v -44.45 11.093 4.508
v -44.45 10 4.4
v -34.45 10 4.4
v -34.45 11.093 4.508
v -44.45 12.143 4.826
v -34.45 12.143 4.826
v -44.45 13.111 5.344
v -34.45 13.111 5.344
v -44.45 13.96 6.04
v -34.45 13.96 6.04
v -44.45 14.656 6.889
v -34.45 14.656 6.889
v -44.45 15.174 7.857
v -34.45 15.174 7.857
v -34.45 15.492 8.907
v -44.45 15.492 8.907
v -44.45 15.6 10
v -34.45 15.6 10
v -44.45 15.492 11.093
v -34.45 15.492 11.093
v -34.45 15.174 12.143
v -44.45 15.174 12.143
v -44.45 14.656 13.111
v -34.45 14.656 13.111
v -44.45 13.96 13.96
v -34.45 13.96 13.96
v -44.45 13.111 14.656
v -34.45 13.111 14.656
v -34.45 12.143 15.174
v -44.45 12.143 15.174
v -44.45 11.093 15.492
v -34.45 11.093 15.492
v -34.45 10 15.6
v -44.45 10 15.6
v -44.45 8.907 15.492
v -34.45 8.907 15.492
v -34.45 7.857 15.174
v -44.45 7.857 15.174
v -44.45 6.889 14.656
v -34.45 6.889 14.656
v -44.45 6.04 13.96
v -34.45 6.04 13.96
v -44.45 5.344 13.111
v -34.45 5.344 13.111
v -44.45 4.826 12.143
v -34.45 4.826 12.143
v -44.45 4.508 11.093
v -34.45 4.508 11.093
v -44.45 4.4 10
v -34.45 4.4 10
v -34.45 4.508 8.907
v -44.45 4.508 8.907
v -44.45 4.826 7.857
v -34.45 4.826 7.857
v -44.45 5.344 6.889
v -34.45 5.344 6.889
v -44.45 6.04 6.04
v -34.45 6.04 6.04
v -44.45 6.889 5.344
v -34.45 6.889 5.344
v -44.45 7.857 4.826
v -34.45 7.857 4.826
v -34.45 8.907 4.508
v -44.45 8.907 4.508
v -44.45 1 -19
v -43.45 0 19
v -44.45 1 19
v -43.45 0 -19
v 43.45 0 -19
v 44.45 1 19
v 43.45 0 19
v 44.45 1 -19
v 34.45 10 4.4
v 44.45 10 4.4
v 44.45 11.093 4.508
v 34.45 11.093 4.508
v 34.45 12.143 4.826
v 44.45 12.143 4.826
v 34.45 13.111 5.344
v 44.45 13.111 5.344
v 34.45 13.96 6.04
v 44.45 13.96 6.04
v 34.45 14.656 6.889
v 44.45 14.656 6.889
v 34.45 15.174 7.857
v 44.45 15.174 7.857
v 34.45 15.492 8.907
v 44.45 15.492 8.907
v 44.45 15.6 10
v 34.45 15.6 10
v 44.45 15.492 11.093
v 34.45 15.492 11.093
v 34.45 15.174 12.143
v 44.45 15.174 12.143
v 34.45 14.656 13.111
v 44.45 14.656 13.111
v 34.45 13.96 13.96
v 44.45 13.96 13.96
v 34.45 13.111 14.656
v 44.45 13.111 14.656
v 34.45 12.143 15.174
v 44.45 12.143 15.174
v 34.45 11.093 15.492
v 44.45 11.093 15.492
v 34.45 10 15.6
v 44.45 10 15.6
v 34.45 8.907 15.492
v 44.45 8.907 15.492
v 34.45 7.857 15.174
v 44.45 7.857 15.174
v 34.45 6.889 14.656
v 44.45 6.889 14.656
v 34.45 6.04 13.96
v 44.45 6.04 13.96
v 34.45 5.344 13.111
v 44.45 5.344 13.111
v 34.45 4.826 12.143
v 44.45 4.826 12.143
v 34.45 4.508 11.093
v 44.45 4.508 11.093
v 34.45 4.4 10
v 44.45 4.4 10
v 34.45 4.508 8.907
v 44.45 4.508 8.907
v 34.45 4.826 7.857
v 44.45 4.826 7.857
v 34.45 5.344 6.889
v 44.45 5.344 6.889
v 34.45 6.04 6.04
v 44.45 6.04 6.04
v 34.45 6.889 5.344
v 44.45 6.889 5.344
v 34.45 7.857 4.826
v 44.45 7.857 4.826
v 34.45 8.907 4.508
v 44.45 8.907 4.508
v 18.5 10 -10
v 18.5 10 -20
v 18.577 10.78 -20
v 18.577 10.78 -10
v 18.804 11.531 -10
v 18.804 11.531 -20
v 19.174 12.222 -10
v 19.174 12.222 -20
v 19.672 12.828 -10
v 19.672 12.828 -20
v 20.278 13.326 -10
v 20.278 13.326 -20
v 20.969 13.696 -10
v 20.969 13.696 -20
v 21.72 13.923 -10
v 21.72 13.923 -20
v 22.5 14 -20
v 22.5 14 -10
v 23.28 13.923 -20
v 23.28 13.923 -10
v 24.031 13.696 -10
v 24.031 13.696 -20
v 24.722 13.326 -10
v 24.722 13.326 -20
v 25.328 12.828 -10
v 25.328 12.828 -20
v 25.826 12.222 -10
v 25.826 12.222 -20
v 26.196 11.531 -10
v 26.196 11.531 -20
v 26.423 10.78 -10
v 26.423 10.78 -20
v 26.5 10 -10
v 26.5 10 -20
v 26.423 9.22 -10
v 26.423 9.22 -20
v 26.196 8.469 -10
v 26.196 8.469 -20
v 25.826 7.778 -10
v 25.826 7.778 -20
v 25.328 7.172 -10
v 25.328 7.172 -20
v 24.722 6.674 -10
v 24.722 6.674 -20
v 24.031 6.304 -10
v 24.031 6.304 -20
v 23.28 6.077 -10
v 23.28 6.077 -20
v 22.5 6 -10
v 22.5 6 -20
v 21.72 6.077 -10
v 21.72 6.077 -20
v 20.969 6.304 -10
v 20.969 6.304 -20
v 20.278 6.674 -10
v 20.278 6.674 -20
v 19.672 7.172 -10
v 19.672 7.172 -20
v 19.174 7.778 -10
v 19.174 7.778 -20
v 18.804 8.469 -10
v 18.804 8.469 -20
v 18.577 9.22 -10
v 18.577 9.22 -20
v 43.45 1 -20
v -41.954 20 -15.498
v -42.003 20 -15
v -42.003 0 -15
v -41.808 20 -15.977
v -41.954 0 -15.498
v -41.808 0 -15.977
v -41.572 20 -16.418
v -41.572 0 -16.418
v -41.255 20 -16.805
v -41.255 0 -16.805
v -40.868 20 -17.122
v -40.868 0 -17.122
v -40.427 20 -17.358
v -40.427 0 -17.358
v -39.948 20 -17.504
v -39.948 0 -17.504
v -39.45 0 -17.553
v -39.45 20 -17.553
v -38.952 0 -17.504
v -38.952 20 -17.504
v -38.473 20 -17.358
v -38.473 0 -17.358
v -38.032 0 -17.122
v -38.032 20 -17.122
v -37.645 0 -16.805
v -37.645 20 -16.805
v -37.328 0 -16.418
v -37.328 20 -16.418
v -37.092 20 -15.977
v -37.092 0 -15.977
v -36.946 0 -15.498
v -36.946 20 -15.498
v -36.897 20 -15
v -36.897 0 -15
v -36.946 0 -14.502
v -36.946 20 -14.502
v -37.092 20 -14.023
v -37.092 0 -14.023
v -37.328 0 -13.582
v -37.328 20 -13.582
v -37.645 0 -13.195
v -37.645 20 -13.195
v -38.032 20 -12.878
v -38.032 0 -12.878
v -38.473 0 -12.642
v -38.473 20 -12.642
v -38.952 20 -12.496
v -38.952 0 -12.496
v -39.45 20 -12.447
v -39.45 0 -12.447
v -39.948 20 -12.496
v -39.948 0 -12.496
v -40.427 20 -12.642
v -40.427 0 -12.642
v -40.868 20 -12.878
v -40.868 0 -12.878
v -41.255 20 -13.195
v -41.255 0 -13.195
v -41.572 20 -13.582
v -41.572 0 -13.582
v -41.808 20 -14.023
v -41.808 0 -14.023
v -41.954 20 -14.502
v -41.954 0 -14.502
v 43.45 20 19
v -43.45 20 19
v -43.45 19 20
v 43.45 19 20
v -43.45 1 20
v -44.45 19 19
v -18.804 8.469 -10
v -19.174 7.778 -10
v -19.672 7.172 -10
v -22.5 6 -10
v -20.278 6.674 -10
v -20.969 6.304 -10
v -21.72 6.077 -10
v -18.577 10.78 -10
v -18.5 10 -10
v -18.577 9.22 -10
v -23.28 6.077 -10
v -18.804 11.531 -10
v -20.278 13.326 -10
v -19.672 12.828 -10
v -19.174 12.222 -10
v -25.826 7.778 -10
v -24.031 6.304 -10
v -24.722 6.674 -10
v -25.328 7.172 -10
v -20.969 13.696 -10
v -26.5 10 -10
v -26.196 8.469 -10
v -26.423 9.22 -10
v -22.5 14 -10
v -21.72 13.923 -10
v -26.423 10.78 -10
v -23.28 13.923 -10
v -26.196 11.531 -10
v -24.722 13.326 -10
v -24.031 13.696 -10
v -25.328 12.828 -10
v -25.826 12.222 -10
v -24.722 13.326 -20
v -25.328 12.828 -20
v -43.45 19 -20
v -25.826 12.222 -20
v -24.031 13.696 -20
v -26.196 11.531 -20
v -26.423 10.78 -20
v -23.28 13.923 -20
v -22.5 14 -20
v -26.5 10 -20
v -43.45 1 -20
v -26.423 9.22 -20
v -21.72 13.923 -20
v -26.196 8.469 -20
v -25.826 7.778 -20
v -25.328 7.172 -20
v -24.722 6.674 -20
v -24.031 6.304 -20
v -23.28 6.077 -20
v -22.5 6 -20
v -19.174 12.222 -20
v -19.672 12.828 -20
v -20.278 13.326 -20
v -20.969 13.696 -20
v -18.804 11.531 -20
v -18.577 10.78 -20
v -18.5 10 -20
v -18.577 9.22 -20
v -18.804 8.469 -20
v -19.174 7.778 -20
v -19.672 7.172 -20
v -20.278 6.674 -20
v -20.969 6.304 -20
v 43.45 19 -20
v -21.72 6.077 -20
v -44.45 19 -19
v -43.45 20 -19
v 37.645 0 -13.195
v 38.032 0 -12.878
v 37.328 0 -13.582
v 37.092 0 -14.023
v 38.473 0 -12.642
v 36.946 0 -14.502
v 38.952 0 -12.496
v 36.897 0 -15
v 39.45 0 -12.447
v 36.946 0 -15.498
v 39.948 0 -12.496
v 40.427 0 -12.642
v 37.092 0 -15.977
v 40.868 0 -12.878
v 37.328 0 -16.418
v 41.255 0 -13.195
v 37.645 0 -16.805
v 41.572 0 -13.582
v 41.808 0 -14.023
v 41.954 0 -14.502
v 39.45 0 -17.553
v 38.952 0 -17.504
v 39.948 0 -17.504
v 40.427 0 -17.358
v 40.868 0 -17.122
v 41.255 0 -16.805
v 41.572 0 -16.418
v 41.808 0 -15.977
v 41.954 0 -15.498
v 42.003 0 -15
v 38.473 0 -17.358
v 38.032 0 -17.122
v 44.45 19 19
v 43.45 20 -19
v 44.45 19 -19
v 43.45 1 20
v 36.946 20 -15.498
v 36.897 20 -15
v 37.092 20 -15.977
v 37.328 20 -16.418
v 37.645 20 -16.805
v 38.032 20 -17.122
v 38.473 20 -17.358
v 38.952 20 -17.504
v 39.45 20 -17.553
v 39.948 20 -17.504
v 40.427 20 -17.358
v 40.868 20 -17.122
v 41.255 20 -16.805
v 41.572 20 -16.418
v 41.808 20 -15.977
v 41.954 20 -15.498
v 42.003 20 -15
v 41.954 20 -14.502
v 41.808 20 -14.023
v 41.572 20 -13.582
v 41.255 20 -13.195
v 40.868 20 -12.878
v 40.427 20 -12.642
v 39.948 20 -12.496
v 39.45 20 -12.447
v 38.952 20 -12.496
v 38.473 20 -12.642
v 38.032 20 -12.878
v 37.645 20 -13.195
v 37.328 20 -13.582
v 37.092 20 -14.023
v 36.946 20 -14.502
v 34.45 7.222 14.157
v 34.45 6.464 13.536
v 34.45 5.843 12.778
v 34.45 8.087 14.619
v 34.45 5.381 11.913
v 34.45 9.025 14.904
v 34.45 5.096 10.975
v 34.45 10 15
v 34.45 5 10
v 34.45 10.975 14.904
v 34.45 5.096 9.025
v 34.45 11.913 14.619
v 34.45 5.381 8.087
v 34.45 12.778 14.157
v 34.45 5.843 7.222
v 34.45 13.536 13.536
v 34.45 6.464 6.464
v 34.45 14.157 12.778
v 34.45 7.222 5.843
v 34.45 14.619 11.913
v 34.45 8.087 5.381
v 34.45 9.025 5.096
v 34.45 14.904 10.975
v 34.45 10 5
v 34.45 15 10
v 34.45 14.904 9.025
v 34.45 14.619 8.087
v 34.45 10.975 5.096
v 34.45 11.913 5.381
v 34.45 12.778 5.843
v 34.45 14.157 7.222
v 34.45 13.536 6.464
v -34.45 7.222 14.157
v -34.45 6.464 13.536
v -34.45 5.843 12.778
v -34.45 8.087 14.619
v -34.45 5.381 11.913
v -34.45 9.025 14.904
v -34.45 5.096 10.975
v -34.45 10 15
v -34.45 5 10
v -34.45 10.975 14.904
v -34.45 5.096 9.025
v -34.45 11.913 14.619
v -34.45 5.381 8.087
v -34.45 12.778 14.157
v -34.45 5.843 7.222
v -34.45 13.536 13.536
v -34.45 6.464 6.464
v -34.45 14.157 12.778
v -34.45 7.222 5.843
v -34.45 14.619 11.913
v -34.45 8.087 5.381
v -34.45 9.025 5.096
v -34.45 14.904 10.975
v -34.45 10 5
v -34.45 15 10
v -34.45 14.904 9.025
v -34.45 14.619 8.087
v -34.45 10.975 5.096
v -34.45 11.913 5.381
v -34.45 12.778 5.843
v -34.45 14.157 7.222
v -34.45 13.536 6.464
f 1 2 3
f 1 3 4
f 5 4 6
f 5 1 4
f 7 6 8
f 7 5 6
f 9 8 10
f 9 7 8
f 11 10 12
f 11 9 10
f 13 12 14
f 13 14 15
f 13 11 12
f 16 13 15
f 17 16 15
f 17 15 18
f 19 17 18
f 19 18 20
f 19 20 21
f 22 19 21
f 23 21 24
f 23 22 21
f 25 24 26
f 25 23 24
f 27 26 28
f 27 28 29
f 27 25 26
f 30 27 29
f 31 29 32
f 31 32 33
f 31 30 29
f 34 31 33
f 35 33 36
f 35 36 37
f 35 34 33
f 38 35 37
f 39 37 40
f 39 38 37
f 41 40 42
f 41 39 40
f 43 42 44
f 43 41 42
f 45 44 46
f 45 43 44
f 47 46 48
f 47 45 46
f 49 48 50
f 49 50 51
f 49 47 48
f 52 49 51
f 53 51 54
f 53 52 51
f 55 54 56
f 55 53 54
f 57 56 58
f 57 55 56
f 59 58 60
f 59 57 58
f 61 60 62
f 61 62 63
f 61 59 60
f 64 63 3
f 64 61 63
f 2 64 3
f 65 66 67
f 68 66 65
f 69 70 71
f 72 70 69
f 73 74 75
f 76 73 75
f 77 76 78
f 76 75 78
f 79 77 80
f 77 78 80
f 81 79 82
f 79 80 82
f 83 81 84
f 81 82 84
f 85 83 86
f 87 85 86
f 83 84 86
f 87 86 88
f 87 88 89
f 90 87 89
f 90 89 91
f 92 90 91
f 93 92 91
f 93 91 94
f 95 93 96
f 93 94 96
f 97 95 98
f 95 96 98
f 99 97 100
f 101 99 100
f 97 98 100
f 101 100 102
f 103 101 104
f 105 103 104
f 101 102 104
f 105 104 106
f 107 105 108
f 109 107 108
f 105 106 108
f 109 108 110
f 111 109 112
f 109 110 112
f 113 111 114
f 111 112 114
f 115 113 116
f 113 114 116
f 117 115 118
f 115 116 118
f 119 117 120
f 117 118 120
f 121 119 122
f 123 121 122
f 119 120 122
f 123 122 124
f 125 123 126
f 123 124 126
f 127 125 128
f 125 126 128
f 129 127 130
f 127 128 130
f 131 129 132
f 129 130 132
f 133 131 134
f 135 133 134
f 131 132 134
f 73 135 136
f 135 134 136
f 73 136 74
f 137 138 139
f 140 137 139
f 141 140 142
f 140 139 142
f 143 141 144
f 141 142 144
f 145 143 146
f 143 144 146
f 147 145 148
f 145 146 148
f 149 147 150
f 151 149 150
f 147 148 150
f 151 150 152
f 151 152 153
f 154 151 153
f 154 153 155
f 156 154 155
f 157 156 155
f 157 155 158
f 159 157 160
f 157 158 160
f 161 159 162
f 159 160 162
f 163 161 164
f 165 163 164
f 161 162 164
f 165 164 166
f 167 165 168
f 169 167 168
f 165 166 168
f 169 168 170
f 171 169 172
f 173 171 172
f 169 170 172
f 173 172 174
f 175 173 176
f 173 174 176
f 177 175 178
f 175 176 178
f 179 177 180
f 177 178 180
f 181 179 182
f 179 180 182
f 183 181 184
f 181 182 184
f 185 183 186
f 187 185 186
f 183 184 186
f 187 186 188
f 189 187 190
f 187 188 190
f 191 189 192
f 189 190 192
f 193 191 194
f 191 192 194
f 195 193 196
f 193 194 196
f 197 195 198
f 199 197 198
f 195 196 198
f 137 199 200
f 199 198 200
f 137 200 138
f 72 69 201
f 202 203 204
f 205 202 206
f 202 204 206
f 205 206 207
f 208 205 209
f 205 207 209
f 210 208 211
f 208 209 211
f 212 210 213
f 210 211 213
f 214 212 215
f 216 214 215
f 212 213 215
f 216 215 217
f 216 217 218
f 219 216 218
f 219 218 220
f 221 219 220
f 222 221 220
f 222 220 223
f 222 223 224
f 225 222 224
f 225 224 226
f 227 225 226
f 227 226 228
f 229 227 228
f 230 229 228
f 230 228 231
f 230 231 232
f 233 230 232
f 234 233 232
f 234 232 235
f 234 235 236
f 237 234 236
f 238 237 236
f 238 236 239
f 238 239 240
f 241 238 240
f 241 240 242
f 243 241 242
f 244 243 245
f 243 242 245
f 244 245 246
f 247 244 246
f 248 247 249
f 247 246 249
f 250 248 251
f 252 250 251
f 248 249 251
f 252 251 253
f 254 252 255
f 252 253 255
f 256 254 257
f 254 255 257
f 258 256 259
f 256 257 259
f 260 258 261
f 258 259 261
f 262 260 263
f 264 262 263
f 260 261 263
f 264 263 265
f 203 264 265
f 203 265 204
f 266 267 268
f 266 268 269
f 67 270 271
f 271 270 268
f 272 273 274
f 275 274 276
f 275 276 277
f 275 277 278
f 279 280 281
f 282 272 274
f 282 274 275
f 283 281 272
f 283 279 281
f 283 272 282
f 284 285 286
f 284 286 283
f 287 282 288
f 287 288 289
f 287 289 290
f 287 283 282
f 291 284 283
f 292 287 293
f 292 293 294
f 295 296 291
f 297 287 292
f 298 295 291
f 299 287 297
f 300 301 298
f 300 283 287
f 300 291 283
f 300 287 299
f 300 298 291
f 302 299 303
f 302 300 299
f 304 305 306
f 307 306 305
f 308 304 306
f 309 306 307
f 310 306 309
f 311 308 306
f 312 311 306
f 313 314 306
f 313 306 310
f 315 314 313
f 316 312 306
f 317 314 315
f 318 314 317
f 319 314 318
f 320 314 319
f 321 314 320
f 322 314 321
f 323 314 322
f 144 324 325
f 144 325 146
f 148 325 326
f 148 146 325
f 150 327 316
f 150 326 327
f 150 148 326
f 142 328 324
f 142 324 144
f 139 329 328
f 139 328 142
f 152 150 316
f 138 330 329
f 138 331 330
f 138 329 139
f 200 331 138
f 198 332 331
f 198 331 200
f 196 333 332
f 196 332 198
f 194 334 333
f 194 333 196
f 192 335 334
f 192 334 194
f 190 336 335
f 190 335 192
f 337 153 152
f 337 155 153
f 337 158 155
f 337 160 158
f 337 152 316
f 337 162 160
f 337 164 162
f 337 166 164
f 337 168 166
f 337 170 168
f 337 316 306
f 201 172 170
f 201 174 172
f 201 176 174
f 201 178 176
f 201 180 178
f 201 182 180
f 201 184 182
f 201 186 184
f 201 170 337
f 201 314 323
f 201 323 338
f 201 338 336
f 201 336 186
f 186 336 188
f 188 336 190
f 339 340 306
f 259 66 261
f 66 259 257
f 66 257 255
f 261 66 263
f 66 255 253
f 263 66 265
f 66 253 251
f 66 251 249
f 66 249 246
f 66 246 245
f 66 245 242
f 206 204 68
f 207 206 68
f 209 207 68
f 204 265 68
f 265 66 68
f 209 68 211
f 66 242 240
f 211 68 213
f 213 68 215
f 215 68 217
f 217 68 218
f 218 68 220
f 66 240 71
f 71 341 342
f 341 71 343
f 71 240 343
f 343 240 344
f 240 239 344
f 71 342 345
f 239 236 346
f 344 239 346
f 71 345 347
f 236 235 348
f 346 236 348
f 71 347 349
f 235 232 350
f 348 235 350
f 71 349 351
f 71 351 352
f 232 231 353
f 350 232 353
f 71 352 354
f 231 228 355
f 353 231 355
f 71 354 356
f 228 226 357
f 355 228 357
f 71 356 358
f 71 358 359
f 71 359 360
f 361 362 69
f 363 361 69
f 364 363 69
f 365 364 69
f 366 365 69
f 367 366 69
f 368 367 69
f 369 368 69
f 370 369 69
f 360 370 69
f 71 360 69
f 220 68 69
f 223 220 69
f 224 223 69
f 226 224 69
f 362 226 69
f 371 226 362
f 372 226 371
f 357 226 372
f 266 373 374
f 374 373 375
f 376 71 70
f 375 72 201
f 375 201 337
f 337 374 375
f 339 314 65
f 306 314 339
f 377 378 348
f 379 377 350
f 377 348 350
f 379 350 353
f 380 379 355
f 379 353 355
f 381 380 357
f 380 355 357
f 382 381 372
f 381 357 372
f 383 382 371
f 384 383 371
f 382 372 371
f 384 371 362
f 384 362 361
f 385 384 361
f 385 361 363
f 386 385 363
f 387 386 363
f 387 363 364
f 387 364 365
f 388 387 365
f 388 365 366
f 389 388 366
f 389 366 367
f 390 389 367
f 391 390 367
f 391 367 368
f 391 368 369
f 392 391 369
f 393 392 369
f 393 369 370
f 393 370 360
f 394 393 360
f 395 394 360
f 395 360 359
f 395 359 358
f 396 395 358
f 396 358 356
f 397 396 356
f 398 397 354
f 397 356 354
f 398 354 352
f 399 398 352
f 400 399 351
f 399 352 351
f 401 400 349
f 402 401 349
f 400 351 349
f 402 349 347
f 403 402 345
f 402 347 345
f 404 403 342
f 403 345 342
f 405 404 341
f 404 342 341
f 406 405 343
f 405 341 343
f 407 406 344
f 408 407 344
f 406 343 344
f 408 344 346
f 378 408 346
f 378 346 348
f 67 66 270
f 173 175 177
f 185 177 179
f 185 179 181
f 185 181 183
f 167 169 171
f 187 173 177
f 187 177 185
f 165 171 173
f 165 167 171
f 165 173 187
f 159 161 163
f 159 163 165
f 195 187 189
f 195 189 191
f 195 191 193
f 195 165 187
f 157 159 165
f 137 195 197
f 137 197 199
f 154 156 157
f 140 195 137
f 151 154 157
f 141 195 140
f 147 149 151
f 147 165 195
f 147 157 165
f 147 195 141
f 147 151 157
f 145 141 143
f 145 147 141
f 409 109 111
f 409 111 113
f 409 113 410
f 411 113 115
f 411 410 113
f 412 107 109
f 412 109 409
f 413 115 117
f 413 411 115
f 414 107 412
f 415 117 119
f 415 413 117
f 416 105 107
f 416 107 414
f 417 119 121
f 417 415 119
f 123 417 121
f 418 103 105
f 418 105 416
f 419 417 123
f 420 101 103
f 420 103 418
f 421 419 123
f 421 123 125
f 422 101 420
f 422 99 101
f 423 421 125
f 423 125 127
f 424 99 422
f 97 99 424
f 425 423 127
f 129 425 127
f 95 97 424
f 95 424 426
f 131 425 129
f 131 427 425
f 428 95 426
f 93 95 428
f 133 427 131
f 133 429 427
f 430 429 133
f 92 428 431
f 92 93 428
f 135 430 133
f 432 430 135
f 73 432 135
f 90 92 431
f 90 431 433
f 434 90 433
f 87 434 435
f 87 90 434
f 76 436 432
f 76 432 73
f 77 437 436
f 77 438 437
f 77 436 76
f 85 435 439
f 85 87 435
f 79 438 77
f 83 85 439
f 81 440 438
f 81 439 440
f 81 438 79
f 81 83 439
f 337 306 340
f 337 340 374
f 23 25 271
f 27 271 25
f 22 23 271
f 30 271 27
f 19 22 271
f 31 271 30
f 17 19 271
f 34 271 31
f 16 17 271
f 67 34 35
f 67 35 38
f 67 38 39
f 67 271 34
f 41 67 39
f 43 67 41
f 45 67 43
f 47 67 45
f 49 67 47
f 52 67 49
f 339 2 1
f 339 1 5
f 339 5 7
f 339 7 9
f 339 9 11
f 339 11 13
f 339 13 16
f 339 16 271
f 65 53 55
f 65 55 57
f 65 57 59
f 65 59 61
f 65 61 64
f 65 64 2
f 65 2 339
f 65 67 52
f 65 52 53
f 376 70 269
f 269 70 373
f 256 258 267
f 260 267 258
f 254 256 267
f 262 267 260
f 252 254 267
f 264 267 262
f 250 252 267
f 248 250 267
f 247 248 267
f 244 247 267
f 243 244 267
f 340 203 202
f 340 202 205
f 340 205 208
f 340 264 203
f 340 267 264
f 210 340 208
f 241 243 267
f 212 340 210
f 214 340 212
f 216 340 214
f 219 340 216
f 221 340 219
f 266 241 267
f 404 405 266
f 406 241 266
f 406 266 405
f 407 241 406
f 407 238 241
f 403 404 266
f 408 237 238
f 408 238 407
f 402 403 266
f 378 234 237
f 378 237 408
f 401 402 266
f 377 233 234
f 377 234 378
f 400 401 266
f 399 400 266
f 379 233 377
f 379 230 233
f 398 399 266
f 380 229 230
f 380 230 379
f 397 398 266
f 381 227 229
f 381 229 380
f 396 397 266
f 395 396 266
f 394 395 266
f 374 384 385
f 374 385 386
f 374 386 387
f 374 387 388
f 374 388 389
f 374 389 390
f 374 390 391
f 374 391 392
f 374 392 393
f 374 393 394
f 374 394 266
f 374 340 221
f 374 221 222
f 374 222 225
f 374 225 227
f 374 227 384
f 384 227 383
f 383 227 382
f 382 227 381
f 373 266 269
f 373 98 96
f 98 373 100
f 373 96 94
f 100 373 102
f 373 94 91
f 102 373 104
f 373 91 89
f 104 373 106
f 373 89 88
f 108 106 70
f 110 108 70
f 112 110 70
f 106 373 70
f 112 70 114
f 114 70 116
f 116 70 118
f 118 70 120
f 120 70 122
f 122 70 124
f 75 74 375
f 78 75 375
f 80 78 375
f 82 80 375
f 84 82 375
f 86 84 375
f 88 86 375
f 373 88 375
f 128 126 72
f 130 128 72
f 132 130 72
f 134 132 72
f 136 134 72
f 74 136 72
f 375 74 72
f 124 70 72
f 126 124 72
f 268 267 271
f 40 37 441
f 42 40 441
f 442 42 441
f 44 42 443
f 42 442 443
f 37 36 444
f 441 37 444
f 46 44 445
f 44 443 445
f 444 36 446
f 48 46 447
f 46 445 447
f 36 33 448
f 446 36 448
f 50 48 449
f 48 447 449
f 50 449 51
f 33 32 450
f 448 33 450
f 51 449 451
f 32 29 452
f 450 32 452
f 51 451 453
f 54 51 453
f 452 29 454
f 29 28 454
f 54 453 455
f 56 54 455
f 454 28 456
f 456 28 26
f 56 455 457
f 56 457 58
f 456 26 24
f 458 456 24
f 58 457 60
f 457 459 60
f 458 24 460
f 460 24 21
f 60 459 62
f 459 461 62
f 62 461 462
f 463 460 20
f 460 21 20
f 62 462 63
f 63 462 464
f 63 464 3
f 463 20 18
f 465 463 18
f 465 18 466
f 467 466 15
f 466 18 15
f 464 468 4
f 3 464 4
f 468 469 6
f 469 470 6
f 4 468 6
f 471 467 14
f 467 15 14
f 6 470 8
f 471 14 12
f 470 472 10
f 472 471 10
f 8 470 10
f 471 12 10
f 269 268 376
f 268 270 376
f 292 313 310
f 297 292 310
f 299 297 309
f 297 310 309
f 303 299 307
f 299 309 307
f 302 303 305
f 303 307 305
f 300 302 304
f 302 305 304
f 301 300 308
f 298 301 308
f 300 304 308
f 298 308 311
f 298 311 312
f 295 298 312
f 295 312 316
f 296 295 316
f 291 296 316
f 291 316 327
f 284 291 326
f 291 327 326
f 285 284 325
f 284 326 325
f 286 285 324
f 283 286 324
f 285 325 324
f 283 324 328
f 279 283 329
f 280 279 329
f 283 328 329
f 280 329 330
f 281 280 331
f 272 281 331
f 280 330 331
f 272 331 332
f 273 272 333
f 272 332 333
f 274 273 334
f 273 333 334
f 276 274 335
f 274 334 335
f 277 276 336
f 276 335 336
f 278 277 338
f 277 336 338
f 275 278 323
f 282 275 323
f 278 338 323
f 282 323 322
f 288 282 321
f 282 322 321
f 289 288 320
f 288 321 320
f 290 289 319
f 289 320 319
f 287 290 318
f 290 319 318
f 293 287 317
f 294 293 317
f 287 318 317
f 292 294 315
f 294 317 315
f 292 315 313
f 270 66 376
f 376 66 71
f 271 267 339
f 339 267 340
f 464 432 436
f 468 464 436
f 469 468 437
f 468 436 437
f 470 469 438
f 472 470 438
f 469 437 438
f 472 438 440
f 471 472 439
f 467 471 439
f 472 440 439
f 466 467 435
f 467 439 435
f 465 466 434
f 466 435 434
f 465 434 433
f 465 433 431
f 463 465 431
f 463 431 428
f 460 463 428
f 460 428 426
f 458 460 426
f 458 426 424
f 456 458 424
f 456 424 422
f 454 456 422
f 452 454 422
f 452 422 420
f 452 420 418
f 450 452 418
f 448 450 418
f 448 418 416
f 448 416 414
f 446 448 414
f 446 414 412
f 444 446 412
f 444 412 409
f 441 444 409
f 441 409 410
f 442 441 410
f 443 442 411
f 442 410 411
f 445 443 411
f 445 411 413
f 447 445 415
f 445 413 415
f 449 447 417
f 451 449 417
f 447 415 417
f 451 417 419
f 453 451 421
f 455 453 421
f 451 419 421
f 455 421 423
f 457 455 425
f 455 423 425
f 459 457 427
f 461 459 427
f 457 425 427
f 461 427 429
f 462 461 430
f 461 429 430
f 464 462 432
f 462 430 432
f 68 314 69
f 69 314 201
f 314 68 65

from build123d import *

# Parameters (mm, degrees)
SKETCH1_W               = 88.9
SKETCH1_H               = 40
BOSS_EXTRUDE1_DEPTH     = 20
SKETCH2_R               = 5
CUT_EXTRUDE1_DEPTH      = 89.9
SKETCH3_R               = 5.6
CUT_EXTRUDE2_DEPTH      = 10
SKETCH4_R               = 4
CUT_EXTRUDE3_DEPTH      = 10
F_1_4_20_TAPPED_HOLE1_D = 5.1054
CHAMFER1_SIZE           = 1


with BuildPart() as part:
    # Sketch1 → Boss-Extrude1 (new body)
    with BuildSketch(Plane(origin=(0, 0, 0), x_dir=(1, 0, 0), z_dir=(0, 1, 0))):
        Rectangle(SKETCH1_W, SKETCH1_H)
    extrude(amount=BOSS_EXTRUDE1_DEPTH)

    # Sketch2 → Cut-Extrude1 (cut, through all)
    with BuildSketch(Plane(origin=(44.45, 0, 0), x_dir=(0, 0, -1), z_dir=(1, 0, 0))):
        with Locations((-10, 10)):
            Circle(SKETCH2_R)
    extrude(amount=-CUT_EXTRUDE1_DEPTH, mode=Mode.SUBTRACT)

    # Sketch3 → Cut-Extrude2 (cut)
    with BuildSketch(Plane(origin=(44.45, 0, 0), x_dir=(0, 0, -1), z_dir=(1, 0, 0))):
        with Locations((-10, 10)):
            Circle(SKETCH3_R)
    cut_extrude2 = extrude(amount=-CUT_EXTRUDE2_DEPTH, mode=Mode.SUBTRACT)

    # Mirror1: Cut-Extrude2 across plane
    add(cut_extrude2.mirror(Plane(origin=(0, 0, 0), x_dir=(0, 0, 1), z_dir=(1, 0, 0))), mode=Mode.SUBTRACT)

    # Sketch4 → Cut-Extrude3 (cut)
    with BuildSketch(Plane(origin=(0, 0, -20), x_dir=(-1, 0, 0), z_dir=(0, 0, -1))):
        with Locations((-22.5, 10)):
            Circle(SKETCH4_R)
        with Locations((22.5, 10)):
            Circle(SKETCH4_R)
    extrude(amount=-CUT_EXTRUDE3_DEPTH, mode=Mode.SUBTRACT)

    # 1/4-20 Tapped Hole1 (through all)
    with Locations(Plane(origin=(0, 20, 0), x_dir=(1, 0, 0), z_dir=(0, 1, 0))):
        with Locations((39.45, 15), (-39.45, 15)):
            Hole(F_1_4_20_TAPPED_HOLE1_D / 2)

    # Chamfer1
    chamfer1_edges = [part.edges().sort_by_distance(p)[0] for p in [
        (-44.45, 20, 0),
        (0, 20, 20),
        (44.45, 20, 0),
        (0, 0, 20),
        (-44.45, 0, 0),
        (0, 0, -20),
        (44.45, 0, 0),
        (0, 20, -20),
        (44.45, 10, 20),
        (-44.45, 10, 20),
        (-44.45, 10, -20),
        (44.45, 10, -20),
    ]]
    chamfer(chamfer1_edges, length=CHAMFER1_SIZE)


solid = part.part
